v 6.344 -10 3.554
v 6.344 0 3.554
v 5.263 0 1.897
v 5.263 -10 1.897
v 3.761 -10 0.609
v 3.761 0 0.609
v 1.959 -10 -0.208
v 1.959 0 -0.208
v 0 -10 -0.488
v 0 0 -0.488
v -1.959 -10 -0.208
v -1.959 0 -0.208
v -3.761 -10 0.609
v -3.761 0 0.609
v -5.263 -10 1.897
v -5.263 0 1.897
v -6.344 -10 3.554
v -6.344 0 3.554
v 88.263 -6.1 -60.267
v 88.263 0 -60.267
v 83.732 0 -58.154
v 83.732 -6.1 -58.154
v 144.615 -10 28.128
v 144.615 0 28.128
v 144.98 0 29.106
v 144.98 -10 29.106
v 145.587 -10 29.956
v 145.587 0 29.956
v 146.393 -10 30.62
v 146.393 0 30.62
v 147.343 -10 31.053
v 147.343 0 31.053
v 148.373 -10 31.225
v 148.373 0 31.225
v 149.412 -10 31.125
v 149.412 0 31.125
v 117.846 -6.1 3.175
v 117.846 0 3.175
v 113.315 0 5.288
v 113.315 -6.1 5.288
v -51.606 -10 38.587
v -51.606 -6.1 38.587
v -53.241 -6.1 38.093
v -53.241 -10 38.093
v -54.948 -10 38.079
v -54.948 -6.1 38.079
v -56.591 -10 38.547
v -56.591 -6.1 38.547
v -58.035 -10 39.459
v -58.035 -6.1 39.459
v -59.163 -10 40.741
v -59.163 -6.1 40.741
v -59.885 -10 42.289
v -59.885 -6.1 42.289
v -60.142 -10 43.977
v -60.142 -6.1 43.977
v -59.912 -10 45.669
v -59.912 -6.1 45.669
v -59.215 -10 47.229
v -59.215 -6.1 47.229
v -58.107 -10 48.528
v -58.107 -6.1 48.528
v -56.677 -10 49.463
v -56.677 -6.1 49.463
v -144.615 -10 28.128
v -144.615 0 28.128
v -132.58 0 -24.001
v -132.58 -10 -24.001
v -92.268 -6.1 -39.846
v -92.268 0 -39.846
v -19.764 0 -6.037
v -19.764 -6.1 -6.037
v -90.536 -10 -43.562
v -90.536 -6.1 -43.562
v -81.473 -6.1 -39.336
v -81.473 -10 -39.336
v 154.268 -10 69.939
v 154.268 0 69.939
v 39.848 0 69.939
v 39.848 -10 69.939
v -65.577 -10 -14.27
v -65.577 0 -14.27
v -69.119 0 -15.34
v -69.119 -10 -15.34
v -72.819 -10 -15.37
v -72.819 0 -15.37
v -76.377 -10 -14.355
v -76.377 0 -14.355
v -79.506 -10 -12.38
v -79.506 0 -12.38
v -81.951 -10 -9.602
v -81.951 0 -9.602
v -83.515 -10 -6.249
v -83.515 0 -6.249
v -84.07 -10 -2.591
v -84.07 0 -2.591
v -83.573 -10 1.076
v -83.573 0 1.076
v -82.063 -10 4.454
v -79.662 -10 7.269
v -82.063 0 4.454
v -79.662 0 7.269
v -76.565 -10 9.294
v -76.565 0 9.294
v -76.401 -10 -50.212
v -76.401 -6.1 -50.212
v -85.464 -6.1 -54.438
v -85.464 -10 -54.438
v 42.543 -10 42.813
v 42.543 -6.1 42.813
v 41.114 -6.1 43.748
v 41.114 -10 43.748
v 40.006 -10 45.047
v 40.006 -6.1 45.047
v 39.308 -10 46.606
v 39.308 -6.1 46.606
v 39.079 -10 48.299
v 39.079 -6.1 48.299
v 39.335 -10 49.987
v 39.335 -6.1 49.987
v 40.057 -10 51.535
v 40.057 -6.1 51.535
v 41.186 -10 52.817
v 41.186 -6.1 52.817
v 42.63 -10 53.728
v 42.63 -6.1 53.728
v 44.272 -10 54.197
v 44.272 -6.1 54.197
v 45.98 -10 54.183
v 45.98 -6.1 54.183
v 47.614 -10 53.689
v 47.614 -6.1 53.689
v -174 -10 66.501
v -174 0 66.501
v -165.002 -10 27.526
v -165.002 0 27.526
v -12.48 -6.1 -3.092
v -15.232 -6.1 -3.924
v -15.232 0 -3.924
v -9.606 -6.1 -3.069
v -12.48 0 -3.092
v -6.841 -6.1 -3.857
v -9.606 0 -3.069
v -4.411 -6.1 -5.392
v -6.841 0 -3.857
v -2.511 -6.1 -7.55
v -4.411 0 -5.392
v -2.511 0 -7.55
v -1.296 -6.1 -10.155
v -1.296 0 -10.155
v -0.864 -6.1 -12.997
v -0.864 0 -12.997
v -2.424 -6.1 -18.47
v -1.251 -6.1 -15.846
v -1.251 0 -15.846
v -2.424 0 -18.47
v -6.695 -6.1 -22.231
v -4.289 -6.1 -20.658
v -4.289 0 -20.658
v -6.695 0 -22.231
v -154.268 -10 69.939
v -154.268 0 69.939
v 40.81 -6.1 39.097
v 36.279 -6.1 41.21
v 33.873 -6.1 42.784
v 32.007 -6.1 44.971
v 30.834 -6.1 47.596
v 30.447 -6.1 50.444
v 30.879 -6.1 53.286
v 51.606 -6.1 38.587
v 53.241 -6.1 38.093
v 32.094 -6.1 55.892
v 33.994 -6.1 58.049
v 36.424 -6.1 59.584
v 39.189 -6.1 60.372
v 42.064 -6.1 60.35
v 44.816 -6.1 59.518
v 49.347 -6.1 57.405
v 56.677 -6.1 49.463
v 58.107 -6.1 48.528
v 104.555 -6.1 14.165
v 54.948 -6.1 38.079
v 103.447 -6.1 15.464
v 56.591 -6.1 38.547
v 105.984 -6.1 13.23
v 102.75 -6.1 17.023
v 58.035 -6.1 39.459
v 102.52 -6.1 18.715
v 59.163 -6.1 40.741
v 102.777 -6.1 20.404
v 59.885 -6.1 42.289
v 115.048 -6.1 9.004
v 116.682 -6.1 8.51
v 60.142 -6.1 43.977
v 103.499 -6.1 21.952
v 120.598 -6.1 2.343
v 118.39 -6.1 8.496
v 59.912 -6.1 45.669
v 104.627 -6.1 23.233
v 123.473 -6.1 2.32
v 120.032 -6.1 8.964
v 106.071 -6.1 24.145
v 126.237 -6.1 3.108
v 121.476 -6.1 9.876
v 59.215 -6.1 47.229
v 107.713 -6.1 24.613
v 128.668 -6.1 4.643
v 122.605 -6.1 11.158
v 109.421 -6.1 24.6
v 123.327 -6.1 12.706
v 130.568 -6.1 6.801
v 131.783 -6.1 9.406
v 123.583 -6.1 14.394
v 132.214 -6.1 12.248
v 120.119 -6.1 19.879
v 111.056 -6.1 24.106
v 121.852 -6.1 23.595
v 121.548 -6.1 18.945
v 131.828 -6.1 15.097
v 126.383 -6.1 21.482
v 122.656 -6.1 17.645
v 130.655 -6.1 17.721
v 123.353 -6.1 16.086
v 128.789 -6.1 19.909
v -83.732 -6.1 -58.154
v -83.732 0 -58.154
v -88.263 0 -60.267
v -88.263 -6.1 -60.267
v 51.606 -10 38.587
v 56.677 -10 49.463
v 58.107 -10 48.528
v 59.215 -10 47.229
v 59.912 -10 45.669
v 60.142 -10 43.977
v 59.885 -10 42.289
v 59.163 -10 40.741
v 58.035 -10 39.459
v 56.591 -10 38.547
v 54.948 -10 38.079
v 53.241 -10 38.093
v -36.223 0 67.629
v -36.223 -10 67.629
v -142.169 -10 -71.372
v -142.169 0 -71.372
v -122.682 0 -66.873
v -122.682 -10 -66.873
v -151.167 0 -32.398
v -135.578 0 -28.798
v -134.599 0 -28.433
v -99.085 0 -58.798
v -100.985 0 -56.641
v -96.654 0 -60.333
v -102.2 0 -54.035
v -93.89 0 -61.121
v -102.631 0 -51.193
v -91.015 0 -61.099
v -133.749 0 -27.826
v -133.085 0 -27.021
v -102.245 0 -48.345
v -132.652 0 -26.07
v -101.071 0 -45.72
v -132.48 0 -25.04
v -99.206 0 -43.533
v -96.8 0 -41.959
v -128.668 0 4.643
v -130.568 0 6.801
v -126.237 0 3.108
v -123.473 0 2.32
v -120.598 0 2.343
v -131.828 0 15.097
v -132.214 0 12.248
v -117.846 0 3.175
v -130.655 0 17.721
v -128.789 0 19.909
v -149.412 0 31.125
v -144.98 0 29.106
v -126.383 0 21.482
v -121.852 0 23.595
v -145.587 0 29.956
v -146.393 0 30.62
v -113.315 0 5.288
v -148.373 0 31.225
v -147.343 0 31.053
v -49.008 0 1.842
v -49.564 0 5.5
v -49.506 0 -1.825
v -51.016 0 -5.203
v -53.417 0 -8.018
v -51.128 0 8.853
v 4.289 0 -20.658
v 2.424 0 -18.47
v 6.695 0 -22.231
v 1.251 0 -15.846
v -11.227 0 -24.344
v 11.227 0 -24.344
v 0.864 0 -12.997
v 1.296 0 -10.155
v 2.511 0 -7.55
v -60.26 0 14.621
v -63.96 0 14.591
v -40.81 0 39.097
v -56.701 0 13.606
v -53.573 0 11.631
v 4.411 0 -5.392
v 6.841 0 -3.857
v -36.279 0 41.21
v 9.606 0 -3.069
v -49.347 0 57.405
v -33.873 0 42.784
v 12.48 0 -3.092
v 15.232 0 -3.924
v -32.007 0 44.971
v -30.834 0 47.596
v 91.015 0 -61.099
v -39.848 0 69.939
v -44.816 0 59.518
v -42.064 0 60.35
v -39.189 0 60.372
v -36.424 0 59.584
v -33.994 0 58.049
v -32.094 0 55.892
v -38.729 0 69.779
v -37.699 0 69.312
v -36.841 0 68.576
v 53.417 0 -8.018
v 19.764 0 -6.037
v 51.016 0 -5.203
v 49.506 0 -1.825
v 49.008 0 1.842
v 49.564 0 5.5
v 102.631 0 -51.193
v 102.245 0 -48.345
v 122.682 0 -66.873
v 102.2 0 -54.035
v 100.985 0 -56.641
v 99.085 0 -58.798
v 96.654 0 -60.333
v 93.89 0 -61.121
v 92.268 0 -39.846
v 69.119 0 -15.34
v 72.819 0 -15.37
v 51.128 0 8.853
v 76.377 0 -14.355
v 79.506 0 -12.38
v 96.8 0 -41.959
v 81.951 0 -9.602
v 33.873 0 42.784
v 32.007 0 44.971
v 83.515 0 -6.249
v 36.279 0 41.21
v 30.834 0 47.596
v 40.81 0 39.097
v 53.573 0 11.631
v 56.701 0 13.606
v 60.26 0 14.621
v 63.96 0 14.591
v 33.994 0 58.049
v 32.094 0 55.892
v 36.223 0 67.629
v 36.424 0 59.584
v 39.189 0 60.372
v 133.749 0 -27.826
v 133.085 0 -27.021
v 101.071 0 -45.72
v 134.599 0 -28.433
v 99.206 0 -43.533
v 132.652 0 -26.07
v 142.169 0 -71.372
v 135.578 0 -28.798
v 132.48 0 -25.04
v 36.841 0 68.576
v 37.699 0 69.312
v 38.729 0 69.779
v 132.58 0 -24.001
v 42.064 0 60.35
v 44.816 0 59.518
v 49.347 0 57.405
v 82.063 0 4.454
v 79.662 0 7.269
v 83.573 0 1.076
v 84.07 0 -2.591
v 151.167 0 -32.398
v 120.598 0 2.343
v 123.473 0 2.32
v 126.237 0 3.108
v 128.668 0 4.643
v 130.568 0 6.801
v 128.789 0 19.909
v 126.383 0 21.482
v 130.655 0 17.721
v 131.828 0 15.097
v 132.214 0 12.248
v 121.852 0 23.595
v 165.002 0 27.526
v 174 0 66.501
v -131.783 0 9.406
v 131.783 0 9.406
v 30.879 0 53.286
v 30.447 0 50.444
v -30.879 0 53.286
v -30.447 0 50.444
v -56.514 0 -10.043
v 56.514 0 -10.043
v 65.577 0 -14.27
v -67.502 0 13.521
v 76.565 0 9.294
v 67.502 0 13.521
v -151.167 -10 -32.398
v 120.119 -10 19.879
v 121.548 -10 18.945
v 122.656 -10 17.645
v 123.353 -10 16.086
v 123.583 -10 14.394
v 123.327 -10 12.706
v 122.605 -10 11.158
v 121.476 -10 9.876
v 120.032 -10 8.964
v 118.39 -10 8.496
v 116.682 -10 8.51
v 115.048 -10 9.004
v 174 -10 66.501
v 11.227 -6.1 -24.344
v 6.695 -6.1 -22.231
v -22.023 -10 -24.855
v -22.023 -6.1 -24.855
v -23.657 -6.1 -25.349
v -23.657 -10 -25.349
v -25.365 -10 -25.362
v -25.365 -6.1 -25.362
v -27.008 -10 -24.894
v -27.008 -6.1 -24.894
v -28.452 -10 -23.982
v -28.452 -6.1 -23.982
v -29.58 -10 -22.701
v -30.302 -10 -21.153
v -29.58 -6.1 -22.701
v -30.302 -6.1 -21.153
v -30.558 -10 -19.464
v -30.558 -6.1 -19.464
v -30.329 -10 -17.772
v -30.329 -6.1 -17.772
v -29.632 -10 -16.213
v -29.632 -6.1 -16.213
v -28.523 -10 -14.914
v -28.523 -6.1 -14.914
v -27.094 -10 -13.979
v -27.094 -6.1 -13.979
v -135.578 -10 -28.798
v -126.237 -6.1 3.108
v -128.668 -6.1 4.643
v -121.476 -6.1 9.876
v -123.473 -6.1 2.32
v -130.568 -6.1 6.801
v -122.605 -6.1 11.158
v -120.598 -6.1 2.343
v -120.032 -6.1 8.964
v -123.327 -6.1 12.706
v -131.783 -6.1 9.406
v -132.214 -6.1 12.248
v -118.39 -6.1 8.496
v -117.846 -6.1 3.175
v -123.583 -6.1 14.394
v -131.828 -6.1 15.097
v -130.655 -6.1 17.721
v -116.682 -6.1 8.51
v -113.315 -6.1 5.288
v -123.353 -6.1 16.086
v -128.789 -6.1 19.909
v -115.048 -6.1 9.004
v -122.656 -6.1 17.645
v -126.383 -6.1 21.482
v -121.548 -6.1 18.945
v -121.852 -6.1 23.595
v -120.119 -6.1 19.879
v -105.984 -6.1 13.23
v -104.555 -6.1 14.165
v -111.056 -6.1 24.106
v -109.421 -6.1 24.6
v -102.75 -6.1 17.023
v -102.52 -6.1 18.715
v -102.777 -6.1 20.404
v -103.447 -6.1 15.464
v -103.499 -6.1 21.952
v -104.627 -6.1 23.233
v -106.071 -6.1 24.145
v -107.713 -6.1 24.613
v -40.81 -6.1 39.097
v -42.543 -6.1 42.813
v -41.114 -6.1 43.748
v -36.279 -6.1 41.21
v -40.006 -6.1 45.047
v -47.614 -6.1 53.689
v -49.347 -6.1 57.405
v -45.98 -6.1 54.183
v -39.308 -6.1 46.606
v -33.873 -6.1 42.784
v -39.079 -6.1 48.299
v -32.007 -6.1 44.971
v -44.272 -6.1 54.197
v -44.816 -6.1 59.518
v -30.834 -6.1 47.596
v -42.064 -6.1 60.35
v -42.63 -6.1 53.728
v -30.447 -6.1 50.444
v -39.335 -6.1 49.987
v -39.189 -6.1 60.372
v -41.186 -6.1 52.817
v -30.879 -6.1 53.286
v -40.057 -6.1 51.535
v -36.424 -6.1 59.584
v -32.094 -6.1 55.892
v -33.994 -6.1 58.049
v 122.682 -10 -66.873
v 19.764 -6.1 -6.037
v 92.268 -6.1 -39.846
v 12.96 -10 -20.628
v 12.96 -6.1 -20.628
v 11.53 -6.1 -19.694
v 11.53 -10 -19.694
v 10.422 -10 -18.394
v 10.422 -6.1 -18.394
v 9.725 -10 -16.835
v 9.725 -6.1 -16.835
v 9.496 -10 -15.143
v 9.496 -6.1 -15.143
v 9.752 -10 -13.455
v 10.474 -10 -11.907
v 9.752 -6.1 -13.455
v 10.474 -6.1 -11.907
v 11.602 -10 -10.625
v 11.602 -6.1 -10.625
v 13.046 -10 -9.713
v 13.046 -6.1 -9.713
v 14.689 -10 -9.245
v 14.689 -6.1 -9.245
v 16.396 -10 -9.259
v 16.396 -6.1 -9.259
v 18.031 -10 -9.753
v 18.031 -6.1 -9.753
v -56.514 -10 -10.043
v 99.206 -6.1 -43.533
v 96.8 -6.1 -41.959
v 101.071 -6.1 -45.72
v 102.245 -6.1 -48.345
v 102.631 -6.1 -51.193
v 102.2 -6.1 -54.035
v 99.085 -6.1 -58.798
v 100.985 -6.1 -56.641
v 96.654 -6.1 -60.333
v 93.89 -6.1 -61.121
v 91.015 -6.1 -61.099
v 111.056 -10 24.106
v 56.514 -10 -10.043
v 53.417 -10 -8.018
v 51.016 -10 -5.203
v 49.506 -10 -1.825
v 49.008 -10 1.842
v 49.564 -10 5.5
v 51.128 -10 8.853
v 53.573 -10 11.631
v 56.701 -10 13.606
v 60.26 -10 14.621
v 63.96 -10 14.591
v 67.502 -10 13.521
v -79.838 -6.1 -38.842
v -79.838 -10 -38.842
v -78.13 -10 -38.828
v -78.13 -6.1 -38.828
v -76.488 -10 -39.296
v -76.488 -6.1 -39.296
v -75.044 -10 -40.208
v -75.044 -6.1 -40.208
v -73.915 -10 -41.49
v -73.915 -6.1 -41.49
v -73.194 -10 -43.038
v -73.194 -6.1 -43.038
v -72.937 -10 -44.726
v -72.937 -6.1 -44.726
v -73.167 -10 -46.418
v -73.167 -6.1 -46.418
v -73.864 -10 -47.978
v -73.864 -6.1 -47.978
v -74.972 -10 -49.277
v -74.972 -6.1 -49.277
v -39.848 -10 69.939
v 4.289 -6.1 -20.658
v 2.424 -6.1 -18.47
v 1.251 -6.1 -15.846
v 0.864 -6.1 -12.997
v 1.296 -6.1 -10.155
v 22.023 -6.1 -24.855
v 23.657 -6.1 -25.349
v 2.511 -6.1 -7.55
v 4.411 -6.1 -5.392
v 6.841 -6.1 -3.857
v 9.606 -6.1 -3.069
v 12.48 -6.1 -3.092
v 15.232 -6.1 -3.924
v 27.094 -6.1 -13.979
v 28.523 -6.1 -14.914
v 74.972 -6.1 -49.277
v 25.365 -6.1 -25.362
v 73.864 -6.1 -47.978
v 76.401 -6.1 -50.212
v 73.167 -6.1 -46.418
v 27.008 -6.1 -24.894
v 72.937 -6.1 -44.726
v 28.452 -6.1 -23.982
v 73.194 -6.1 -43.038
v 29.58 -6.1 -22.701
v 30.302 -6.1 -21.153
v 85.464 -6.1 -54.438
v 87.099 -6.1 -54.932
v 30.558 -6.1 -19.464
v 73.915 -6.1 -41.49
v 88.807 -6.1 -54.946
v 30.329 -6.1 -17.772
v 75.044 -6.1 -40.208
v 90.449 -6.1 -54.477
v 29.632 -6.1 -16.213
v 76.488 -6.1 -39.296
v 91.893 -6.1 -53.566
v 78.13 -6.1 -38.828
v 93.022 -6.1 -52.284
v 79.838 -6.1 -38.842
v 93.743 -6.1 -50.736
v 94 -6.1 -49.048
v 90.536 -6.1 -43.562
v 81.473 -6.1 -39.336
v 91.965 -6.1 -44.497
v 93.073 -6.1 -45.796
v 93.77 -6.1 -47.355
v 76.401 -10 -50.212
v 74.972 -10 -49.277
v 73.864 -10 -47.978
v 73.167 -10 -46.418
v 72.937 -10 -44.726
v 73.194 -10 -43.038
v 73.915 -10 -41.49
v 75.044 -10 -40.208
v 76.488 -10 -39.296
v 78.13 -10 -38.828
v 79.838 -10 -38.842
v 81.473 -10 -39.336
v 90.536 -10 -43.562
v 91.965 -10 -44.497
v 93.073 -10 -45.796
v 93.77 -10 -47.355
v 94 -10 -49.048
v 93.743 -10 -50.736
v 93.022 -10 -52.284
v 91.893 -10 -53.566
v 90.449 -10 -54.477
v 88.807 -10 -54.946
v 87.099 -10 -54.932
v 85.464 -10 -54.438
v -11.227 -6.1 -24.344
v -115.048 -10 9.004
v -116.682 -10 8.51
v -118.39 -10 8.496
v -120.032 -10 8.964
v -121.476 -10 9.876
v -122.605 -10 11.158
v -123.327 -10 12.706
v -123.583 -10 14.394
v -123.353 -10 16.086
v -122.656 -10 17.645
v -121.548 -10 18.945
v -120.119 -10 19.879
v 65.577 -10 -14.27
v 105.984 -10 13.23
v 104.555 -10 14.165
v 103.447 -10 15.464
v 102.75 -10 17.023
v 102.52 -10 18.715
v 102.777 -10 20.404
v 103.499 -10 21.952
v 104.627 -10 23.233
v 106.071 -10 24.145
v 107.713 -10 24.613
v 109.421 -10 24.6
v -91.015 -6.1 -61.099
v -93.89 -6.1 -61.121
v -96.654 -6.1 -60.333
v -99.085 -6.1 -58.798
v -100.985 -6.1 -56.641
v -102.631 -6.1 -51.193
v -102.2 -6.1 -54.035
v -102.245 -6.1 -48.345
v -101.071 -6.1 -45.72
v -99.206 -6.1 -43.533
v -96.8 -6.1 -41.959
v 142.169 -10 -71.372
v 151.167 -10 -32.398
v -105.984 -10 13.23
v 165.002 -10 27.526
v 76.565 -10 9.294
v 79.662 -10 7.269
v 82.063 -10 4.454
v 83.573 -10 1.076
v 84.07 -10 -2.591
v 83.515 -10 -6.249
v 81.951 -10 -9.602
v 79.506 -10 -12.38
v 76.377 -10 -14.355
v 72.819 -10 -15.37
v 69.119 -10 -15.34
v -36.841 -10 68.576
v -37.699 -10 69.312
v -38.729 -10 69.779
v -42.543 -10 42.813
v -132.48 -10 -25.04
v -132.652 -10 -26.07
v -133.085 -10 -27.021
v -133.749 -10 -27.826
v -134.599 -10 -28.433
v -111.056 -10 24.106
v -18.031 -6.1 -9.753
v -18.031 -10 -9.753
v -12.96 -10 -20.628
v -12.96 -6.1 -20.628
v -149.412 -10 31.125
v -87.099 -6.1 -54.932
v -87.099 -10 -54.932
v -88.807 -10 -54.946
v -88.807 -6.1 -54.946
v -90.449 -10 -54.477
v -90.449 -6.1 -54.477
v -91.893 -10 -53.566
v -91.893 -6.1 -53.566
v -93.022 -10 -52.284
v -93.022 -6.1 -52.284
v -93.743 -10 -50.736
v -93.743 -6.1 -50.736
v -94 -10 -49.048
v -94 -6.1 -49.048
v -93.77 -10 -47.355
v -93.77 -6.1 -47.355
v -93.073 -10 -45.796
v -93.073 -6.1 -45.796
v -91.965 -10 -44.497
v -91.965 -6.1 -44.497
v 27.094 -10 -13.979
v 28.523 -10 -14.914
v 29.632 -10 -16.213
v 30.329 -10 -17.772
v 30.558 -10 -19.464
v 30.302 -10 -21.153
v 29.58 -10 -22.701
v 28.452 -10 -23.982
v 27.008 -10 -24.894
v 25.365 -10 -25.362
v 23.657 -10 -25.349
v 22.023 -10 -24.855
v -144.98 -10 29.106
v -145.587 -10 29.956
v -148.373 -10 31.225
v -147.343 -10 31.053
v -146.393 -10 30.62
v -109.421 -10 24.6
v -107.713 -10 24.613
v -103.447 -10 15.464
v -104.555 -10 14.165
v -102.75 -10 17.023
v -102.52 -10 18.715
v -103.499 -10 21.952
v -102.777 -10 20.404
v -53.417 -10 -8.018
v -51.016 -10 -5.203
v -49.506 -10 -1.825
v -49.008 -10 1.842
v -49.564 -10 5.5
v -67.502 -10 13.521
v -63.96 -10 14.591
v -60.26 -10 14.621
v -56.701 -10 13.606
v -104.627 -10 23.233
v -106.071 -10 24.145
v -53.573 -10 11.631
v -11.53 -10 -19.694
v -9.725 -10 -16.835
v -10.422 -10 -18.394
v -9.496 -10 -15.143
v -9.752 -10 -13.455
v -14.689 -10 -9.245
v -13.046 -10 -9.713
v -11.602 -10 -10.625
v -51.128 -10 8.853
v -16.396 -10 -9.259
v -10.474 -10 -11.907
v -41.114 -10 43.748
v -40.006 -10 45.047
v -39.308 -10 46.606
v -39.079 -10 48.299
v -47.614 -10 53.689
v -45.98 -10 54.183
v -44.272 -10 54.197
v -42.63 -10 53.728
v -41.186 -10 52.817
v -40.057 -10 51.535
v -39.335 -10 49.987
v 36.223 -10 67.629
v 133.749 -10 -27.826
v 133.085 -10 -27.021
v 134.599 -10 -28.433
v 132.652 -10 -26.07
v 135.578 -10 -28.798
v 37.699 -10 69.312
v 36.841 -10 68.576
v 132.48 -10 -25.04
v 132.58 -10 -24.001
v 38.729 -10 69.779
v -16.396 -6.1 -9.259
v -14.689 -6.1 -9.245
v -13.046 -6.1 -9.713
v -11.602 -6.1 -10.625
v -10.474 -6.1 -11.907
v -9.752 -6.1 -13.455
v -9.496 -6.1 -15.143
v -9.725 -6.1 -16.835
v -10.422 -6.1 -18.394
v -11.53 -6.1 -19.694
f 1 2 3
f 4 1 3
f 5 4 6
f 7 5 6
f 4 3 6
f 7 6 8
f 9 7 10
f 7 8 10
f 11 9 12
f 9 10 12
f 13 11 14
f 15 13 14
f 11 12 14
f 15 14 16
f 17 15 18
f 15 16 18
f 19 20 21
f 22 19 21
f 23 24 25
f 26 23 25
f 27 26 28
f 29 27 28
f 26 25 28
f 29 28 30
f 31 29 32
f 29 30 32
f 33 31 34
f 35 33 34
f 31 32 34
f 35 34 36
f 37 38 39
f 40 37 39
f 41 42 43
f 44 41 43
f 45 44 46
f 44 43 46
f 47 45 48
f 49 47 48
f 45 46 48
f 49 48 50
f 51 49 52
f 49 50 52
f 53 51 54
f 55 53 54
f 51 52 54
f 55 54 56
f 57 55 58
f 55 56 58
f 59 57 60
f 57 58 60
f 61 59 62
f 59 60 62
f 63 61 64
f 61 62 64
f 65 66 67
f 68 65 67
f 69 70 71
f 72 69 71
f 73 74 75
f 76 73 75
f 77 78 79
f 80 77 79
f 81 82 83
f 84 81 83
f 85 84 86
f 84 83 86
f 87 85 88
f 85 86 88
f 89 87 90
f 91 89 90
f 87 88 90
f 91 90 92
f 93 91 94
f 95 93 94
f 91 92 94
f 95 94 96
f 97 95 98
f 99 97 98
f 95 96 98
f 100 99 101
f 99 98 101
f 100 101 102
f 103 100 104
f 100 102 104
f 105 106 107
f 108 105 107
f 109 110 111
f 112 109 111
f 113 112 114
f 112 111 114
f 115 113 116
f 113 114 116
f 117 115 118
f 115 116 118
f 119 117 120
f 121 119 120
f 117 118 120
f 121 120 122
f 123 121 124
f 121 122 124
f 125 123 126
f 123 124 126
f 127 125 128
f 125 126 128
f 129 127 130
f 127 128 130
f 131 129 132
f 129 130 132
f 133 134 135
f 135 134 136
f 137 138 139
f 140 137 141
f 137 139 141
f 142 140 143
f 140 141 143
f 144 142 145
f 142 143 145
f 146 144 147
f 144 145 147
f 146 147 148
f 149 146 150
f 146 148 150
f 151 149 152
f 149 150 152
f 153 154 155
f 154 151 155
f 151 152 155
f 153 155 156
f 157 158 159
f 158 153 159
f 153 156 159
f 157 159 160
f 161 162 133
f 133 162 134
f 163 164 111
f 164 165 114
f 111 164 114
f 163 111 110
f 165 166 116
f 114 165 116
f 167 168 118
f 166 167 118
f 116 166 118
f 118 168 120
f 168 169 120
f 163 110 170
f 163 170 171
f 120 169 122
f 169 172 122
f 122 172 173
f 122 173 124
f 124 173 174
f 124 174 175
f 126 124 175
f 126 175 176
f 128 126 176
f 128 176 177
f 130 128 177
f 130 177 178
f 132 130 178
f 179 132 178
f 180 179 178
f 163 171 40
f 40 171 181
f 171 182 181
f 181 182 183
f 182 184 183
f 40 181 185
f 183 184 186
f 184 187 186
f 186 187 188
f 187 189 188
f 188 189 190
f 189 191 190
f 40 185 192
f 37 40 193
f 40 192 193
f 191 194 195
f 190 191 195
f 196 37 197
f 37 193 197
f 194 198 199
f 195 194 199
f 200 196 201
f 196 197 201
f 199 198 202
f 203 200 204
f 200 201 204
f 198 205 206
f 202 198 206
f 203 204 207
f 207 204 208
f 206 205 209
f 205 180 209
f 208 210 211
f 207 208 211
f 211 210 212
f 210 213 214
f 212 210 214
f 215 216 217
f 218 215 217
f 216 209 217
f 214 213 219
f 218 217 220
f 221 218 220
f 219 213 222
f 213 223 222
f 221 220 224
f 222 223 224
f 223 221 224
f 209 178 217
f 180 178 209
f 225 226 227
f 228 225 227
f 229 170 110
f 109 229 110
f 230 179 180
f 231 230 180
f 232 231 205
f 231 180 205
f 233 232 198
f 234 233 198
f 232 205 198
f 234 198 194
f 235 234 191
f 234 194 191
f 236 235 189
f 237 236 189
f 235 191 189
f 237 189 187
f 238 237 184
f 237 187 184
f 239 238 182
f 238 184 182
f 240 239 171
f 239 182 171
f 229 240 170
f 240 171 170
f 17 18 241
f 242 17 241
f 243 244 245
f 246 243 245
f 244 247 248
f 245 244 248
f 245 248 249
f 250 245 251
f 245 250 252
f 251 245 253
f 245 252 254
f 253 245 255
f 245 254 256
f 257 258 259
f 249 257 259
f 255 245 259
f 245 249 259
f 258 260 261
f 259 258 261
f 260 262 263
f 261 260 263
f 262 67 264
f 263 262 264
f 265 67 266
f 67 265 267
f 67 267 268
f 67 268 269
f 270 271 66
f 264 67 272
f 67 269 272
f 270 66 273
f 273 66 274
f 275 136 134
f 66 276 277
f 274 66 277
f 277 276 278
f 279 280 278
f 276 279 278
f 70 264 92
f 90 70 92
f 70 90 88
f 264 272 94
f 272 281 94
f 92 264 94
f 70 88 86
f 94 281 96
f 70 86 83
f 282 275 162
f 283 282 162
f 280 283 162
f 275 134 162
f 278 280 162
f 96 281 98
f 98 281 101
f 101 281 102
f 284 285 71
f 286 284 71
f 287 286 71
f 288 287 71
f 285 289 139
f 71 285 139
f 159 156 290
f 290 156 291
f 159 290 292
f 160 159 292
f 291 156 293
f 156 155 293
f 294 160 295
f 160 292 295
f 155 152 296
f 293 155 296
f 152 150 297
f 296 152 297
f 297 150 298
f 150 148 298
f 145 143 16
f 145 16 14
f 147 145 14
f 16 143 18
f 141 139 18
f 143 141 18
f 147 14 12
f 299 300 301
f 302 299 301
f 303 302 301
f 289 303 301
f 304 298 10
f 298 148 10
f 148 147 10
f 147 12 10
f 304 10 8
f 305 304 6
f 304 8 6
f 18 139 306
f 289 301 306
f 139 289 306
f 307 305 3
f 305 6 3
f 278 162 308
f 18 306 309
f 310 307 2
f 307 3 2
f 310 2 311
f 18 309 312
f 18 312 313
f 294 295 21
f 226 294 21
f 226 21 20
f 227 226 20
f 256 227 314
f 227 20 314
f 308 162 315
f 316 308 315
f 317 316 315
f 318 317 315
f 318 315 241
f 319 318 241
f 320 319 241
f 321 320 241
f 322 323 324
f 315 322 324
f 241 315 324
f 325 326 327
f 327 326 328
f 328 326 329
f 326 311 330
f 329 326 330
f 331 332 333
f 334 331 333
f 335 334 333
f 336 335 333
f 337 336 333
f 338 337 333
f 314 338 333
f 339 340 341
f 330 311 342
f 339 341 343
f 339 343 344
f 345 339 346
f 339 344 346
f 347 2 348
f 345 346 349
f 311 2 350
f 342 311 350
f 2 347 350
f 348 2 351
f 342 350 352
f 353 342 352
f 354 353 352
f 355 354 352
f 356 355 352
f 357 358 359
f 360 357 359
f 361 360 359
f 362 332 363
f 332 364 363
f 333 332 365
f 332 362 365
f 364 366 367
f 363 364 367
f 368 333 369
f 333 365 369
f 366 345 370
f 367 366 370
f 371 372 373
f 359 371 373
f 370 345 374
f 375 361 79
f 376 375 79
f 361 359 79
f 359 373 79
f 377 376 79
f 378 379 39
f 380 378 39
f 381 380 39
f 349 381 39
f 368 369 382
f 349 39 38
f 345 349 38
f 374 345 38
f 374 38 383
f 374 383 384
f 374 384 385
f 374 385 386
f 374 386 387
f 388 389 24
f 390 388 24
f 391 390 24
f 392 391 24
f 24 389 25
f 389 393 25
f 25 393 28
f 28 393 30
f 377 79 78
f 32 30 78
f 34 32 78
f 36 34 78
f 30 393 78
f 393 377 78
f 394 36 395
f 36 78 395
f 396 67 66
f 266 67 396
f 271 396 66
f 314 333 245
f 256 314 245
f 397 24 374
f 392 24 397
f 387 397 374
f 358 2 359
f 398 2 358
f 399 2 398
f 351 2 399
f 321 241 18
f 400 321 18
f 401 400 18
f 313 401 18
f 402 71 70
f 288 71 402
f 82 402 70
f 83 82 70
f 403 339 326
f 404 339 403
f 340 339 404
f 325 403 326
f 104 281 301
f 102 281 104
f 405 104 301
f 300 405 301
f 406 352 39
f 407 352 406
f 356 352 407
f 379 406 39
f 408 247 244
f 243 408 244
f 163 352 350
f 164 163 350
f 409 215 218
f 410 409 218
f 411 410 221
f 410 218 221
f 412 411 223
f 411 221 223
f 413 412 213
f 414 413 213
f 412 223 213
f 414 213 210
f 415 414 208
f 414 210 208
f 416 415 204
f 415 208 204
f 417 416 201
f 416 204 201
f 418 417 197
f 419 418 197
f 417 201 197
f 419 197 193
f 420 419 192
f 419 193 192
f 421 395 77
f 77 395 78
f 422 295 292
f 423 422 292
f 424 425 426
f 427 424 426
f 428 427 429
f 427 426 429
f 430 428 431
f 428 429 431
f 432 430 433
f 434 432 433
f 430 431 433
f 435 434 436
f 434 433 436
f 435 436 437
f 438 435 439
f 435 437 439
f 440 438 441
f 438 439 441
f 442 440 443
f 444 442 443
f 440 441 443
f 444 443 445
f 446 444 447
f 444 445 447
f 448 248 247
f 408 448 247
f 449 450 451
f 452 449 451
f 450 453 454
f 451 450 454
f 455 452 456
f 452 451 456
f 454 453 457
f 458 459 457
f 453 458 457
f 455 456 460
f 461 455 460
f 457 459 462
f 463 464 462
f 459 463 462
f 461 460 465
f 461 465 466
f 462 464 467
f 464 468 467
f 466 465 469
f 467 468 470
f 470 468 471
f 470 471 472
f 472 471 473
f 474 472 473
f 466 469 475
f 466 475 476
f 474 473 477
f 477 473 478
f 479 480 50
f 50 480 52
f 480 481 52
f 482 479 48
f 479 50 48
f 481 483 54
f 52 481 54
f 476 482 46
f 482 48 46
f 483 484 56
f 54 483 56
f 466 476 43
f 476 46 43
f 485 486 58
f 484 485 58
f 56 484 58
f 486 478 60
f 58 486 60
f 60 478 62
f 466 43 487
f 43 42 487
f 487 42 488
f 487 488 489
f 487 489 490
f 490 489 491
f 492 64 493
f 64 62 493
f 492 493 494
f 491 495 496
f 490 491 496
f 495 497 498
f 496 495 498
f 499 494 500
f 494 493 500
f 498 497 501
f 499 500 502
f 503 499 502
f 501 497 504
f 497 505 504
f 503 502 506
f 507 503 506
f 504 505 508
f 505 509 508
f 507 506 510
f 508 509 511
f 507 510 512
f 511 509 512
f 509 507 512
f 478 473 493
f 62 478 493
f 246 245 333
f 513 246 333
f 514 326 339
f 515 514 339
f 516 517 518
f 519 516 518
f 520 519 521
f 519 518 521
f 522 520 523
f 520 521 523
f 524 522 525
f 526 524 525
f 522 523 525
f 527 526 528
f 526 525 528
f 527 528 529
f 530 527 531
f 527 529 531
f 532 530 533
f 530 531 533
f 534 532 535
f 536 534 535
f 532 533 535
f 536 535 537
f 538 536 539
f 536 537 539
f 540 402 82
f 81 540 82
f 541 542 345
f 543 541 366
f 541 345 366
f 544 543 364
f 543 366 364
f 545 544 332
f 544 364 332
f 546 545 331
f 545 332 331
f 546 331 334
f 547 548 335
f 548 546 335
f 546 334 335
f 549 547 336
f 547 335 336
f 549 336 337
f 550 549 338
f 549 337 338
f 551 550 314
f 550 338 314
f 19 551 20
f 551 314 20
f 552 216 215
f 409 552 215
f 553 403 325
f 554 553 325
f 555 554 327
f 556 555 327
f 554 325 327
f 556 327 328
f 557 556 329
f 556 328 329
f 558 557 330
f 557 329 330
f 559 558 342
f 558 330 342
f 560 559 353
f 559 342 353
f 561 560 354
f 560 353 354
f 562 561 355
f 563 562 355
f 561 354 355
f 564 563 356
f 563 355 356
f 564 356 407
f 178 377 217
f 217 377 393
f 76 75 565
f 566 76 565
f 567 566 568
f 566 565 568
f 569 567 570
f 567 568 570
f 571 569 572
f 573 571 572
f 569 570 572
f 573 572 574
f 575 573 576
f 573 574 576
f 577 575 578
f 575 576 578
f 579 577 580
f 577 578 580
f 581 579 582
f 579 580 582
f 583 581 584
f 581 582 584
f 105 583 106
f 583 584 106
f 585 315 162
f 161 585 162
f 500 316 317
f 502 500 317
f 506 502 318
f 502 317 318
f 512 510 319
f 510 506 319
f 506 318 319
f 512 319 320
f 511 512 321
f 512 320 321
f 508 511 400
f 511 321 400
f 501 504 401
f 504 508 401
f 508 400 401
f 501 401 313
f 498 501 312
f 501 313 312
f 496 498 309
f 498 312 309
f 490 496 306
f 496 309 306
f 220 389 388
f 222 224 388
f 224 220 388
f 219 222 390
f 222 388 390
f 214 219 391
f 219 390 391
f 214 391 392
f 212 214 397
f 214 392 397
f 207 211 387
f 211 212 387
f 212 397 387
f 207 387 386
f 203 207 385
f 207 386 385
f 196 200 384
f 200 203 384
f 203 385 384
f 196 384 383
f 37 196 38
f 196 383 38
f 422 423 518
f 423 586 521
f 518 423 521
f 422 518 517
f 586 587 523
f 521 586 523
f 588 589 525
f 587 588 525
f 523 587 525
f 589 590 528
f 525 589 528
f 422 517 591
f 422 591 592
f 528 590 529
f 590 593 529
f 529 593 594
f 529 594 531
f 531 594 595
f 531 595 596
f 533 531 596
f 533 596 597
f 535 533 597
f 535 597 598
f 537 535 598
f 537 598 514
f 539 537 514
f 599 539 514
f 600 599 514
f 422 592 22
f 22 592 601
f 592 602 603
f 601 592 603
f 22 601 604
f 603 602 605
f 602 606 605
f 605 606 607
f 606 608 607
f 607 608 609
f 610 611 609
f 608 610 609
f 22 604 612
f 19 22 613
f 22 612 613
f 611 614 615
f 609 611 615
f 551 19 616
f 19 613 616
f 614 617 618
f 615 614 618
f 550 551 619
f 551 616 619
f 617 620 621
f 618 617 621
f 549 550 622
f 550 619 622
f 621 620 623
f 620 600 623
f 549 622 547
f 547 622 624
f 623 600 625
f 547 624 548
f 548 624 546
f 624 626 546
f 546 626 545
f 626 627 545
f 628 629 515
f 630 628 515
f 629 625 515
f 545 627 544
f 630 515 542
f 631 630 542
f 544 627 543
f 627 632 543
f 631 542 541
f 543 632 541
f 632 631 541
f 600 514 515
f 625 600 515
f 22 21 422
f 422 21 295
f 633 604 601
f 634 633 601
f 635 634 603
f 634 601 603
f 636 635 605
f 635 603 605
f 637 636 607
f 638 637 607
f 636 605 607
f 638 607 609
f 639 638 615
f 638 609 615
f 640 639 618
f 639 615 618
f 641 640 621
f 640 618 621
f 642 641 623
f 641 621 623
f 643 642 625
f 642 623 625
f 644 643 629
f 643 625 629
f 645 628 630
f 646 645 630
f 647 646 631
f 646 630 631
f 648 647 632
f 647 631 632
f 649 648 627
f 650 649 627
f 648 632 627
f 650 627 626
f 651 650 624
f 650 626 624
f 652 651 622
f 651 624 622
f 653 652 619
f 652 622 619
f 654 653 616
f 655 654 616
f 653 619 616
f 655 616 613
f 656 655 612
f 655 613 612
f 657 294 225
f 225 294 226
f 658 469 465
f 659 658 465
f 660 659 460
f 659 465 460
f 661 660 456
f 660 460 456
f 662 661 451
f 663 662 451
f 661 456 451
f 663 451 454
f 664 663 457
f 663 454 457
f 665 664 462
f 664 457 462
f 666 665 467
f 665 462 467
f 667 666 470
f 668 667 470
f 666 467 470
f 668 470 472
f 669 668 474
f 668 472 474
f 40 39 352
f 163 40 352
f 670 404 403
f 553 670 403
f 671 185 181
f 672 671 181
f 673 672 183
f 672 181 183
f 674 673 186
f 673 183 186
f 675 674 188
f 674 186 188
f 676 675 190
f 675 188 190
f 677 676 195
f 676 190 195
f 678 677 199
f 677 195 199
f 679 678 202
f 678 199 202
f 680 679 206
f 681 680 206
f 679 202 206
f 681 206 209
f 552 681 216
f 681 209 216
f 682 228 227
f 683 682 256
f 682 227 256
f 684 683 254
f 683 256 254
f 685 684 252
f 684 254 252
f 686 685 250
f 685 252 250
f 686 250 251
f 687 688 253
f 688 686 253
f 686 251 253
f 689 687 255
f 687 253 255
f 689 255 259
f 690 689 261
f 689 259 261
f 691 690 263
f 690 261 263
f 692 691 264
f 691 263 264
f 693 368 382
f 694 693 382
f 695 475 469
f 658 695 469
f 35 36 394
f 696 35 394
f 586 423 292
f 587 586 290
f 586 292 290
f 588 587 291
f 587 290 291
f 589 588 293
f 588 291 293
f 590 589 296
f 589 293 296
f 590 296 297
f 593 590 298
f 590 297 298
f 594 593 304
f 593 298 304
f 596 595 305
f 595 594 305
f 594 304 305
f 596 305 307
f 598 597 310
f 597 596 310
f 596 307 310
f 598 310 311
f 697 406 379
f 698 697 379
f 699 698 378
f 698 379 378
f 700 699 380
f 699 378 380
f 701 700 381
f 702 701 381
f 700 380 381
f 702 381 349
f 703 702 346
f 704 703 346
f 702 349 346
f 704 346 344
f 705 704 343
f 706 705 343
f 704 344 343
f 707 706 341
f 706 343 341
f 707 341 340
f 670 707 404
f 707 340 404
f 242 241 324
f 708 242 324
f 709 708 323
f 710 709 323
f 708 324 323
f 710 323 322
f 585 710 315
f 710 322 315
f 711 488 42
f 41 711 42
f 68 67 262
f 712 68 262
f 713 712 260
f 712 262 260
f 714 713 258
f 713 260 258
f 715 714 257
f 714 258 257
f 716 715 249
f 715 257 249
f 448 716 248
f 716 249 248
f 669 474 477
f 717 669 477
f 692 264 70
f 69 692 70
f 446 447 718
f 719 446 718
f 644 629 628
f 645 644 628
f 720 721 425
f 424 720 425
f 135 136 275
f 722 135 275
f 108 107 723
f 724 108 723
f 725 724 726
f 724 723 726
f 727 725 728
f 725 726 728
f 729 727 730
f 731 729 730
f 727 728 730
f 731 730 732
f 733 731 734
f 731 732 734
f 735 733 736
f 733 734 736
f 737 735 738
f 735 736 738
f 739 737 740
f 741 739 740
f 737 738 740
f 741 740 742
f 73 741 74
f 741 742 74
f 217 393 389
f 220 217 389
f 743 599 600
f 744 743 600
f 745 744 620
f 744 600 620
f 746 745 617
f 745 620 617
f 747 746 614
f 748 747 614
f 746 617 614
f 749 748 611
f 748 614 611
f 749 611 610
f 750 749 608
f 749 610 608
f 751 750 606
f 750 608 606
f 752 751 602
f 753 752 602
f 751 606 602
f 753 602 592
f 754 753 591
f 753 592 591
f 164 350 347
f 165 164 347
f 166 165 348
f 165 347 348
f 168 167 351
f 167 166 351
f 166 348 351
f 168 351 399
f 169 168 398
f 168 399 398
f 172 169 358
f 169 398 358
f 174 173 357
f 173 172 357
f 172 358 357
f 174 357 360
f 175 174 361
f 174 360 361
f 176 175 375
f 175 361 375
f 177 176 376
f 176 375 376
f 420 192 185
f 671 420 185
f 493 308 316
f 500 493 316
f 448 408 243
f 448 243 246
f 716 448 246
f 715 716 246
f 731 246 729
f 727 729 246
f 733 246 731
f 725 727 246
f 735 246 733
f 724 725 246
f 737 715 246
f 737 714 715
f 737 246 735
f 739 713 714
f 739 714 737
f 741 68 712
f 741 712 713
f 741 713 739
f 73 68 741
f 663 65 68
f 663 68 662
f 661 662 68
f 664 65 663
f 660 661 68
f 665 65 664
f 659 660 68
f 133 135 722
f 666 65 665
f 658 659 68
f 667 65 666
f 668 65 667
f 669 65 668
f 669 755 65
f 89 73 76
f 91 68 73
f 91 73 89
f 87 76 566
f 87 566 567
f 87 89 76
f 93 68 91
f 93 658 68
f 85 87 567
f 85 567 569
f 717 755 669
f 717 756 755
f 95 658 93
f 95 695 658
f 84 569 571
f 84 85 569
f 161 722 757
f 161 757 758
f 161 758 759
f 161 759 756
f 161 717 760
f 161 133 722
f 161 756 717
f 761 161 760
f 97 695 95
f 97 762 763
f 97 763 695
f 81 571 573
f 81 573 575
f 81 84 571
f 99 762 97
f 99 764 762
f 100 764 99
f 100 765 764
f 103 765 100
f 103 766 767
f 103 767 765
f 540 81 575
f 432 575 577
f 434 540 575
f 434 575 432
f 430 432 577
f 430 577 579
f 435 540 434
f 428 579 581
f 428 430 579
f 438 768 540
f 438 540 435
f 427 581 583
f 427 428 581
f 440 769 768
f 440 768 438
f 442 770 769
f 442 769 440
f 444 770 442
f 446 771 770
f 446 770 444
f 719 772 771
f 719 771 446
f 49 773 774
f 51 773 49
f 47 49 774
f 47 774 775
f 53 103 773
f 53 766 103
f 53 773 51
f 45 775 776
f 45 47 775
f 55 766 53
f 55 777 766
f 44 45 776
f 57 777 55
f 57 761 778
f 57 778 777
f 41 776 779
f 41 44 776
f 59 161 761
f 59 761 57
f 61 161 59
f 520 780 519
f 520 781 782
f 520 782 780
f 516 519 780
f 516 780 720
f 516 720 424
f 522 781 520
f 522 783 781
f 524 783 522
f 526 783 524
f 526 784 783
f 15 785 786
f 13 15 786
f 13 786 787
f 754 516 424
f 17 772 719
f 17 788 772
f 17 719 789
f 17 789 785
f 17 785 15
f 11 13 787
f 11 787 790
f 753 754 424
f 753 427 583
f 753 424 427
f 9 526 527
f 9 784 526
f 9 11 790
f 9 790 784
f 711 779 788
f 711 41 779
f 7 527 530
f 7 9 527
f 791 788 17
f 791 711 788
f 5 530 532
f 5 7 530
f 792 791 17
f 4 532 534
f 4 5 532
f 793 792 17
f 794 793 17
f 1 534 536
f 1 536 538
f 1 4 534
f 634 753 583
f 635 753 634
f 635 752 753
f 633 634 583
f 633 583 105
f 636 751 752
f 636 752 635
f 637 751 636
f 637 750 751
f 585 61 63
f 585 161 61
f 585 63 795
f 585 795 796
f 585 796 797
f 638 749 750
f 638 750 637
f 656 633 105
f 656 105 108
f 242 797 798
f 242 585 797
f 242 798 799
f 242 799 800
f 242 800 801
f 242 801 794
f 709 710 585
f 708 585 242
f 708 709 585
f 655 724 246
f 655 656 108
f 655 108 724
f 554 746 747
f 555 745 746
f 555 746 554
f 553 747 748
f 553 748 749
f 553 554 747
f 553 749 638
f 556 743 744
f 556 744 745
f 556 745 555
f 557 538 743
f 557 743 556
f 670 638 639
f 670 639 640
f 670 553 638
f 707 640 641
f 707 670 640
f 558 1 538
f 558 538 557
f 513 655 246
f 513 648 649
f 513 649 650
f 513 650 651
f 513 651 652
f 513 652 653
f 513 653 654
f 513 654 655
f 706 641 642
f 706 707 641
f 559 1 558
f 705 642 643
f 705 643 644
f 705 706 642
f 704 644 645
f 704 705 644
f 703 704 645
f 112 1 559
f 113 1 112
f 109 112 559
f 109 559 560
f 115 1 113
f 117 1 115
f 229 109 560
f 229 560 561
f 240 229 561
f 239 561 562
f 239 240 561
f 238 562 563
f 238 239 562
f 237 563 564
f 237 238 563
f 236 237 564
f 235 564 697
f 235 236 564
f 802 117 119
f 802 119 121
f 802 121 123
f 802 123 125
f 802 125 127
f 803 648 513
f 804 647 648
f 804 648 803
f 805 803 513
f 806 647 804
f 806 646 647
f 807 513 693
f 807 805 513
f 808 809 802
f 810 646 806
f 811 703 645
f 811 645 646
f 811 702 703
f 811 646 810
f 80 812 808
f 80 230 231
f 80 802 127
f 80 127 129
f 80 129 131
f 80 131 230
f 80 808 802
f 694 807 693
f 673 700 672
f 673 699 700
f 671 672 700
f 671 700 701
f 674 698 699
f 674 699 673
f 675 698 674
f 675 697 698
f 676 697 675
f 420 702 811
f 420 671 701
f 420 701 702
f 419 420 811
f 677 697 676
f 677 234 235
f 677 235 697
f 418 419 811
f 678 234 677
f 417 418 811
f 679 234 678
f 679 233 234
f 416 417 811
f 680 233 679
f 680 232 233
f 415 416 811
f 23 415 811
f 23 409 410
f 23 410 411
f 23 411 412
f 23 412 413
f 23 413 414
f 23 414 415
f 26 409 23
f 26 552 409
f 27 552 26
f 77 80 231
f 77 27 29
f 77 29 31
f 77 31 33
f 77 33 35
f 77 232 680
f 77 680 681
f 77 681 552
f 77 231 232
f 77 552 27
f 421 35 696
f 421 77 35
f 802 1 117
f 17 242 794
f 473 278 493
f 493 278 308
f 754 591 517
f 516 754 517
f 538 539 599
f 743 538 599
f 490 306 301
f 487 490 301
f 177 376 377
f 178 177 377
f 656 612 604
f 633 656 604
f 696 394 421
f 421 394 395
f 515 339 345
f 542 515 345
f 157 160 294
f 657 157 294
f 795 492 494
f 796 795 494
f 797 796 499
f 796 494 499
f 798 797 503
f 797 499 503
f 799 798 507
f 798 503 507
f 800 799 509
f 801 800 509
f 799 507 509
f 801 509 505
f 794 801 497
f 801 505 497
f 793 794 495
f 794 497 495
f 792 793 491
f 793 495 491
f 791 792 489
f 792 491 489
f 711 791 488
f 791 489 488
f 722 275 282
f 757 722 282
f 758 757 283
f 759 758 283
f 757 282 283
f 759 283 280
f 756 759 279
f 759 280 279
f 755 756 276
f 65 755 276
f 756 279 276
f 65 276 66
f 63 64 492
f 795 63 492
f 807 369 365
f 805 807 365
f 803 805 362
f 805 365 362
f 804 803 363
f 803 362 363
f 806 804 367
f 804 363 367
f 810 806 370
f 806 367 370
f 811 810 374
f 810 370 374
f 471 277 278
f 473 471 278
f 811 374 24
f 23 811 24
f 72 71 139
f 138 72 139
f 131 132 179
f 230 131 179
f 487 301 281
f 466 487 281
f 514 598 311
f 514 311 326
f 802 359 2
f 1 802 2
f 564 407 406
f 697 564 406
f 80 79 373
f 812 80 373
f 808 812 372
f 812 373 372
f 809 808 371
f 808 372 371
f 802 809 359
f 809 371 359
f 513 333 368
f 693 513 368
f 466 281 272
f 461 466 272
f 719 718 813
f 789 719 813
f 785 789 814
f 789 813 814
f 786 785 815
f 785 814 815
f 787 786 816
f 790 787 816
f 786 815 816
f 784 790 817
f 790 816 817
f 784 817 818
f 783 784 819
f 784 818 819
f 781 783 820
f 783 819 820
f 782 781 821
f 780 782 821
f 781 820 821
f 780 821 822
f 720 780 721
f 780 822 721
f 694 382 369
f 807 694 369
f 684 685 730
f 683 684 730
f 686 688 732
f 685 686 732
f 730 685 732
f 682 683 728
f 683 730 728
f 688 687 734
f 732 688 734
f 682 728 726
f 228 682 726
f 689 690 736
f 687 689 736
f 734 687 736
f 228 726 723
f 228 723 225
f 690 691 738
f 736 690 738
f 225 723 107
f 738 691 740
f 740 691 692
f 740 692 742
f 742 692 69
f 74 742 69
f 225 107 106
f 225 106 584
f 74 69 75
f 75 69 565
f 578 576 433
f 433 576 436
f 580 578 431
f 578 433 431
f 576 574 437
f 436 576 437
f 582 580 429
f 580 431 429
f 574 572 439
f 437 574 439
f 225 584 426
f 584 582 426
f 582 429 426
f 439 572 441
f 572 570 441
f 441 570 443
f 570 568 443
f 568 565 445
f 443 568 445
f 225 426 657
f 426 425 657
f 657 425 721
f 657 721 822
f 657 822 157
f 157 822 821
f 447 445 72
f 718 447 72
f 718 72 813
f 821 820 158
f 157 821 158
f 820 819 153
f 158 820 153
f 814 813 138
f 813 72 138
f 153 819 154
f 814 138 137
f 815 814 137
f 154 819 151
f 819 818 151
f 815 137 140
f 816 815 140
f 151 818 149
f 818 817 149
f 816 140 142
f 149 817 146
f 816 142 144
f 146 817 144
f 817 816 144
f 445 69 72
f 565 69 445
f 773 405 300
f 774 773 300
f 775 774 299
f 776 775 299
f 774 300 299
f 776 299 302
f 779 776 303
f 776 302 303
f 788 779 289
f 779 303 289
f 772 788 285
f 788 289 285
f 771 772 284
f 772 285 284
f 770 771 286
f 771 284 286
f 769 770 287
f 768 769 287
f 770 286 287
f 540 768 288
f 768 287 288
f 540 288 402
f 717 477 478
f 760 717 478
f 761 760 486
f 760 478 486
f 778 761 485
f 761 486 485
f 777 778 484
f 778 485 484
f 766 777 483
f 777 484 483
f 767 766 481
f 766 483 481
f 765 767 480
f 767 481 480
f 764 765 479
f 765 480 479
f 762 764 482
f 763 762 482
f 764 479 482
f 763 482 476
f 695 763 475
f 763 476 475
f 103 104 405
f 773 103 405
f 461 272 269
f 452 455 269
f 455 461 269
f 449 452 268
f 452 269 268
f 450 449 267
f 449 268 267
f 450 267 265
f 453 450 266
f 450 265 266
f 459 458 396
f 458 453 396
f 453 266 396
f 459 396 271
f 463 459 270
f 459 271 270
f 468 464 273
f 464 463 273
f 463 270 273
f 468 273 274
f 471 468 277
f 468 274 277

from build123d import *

# Parameters (mm, degrees)
F1_DEPTH = 10
F2_START = 6.1
F2_DEPTH = 3.9


with BuildPart() as f1:
    # F0 (on Front) → F1 (new body)
    with BuildSketch(Plane.XZ):
        with BuildLine():
            ThreePointArc((-36.2228804372, 67.6292184035), (-37.698913152, 69.3123111398), (-39.8481115853, 69.9387453565))
            Line((-39.8481115853, 69.9387453565), (-154.2675887644, 69.9387453565))
            Line((-154.2675887644, 69.9387453565), (-174, 66.5009789131))
            Line((-174, 66.5009789131), (-165.0019578262, 27.5261763217))
            Line((-165.0019578262, 27.5261763217), (-149.4120367897, 31.1253931912))
            ThreePointArc((-149.4120367897, 31.1253931912), (-146.3925555154, 30.6201053167), (-144.6147523132, 28.1277171494))
            Line((-144.6147523132, 28.1277171494), (-132.5798709058, -24.0010813166))
            ThreePointArc((-132.5798709058, -24.0010813166), (-133.0851587803, -27.0205625909), (-135.5775469475, -28.7983657931))
            Line((-135.5775469475, -28.7983657931), (-151.1674679841, -32.3975826626))
            Line((-151.1674679841, -32.3975826626), (-142.1694258103, -71.372385254))
            Line((-142.1694258103, -71.372385254), (-122.6820245146, -66.8733641671))
            Line((-122.6820245146, -66.8733641671), (122.6820245146, -66.8733641671))
            Line((122.6820245146, -66.8733641671), (142.1694258103, -71.372385254))
            Line((142.1694258103, -71.372385254), (151.1674679841, -32.3975826626))
            Line((151.1674679841, -32.3975826626), (135.5775469475, -28.7983657931))
            ThreePointArc((135.5775469475, -28.7983657931), (133.0851587803, -27.0205625909), (132.5798709058, -24.0010813166))
            Line((132.5798709058, -24.0010813166), (144.6147523132, 28.1277171494))
            ThreePointArc((144.6147523132, 28.1277171494), (146.3925555154, 30.6201053167), (149.4120367897, 31.1253931912))
            Line((149.4120367897, 31.1253931912), (165.0019578262, 27.5261763217))
            Line((165.0019578262, 27.5261763217), (174, 66.5009789131))
            Line((174, 66.5009789131), (154.2675887644, 69.9387453565))
            Line((154.2675887644, 69.9387453565), (39.8481115853, 69.9387453565))
            ThreePointArc((39.8481115853, 69.9387453565), (37.698913152, 69.3123111398), (36.2228804372, 67.6292184035))
            Line((36.2228804372, 67.6292184035), (6.3441545093, 3.554083875))
            ThreePointArc((6.3441545093, 3.554083875), (0, -0.4875882928), (-6.3441545093, 3.554083875))
            Line((-6.3441545093, 3.554083875), (-36.2228804372, 67.6292184035))
        make_face()
        with BuildLine():
            Line((-96.7999833788, -41.9593826596), (-92.2684444436, -39.8462913509))
            Line((-92.2684444436, -39.8462913509), (-19.7638214806, -6.0368304117))
            Line((-19.7638214806, -6.0368304117), (-15.2322825455, -3.923739103))
            ThreePointArc((-15.2322825455, -3.923739103), (-1.8101294528, -8.8090033085), (-6.6953936583, -22.2311564011))
            Line((-6.6953936583, -22.2311564011), (-11.2269325935, -24.3442477098))
            Line((-11.2269325935, -24.3442477098), (-83.7315555564, -58.1537086491))
            Line((-83.7315555564, -58.1537086491), (-88.2630944916, -60.2667999578))
            ThreePointArc((-88.2630944916, -60.2667999578), (-101.6852475843, -55.3815357523), (-96.7999833788, -41.9593826596))
        make_face(mode=Mode.SUBTRACT)
        with BuildLine():
            Line((88.2630944916, -60.2667999578), (83.7315555564, -58.1537086491))
            Line((83.7315555564, -58.1537086491), (11.2269325935, -24.3442477098))
            Line((11.2269325935, -24.3442477098), (6.6953936583, -22.2311564011))
            ThreePointArc((6.6953936583, -22.2311564011), (1.8101294528, -8.8090033085), (15.2322825455, -3.923739103))
            Line((15.2322825455, -3.923739103), (19.7638214806, -6.0368304117))
            Line((19.7638214806, -6.0368304117), (92.2684444436, -39.8462913509))
            Line((92.2684444436, -39.8462913509), (96.7999833788, -41.9593826596))
            ThreePointArc((96.7999833788, -41.9593826596), (101.6852475843, -55.3815357523), (88.2630944916, -60.2667999578))
        make_face(mode=Mode.SUBTRACT)
        with BuildLine():
            ThreePointArc((-65.576829212, -14.2695895243), (-82.8528678461, -7.9816256954), (-76.5649040173, 9.2944129387))
            Line((-76.5649040173, 9.2944129387), (-67.5018261469, 13.5205955561))
            ThreePointArc((-67.5018261469, 13.5205955561), (-50.2257875128, 7.2326317272), (-56.5137513416, -10.0434069069))
            Line((-56.5137513416, -10.0434069069), (-65.576829212, -14.2695895243))
        make_face(mode=Mode.SUBTRACT)
        with BuildLine():
            Line((-40.8102109153, 39.0972973828), (-113.3148338783, 5.2878364435))
            Line((-113.3148338783, 5.2878364435), (-117.8463728135, 3.1747451348))
            ThreePointArc((-117.8463728135, 3.1747451348), (-131.2685259061, 8.0600093403), (-126.3832617006, 21.4821624329))
            Line((-126.3832617006, 21.4821624329), (-121.8517227654, 23.5952537416))
            Line((-121.8517227654, 23.5952537416), (-49.3470998025, 57.4047146809))
            Line((-49.3470998025, 57.4047146809), (-44.8155608673, 59.5178059896))
            ThreePointArc((-44.8155608673, 59.5178059896), (-31.3934077747, 54.6325417841), (-36.2786719802, 41.2103886915))
            Line((-36.2786719802, 41.2103886915), (-40.8102109153, 39.0972973828))
        make_face(mode=Mode.SUBTRACT)
        with BuildLine():
            ThreePointArc((76.5649040173, 9.2944129387), (82.8528678461, -7.9816256954), (65.576829212, -14.2695895243))
            Line((65.576829212, -14.2695895243), (56.5137513416, -10.0434069069))
            ThreePointArc((56.5137513416, -10.0434069069), (50.2257875128, 7.2326317272), (67.5018261469, 13.5205955561))
            Line((67.5018261469, 13.5205955561), (76.5649040173, 9.2944129387))
        make_face(mode=Mode.SUBTRACT)
        with BuildLine():
            Line((49.3470998025, 57.4047146809), (121.8517227654, 23.5952537416))
            Line((121.8517227654, 23.5952537416), (126.3832617006, 21.4821624329))
            ThreePointArc((126.3832617006, 21.4821624329), (131.2685259061, 8.0600093403), (117.8463728135, 3.1747451348))
            Line((117.8463728135, 3.1747451348), (113.3148338783, 5.2878364435))
            Line((113.3148338783, 5.2878364435), (40.8102109153, 39.0972973828))
            Line((40.8102109153, 39.0972973828), (36.2786719802, 41.2103886915))
            ThreePointArc((36.2786719802, 41.2103886915), (31.3934077747, 54.6325417841), (44.8155608673, 59.5178059896))
            Line((44.8155608673, 59.5178059896), (49.3470998025, 57.4047146809))
        make_face(mode=Mode.SUBTRACT)
    extrude(amount=F1_DEPTH)

    # F0 (on Front) → F2 (join)
    with BuildSketch(Plane.XZ.offset(F2_START)):
        with BuildLine():
            Line((-117.8463728135, 3.1747451348), (-113.3148338783, 5.2878364435))
            Line((-113.3148338783, 5.2878364435), (-40.8102109153, 39.0972973828))
            Line((-40.8102109153, 39.0972973828), (-36.2786719802, 41.2103886915))
            ThreePointArc((-36.2786719802, 41.2103886915), (-31.3934077747, 54.6325417841), (-44.8155608673, 59.5178059896))
            Line((-44.8155608673, 59.5178059896), (-49.3470998025, 57.4047146809))
            Line((-49.3470998025, 57.4047146809), (-121.8517227654, 23.5952537416))
            Line((-121.8517227654, 23.5952537416), (-126.3832617006, 21.4821624329))
            ThreePointArc((-126.3832617006, 21.4821624329), (-131.2685259061, 8.0600093403), (-117.8463728135, 3.1747451348))
        make_face()
        with BuildLine():
            Line((-105.984490881, 13.2298809878), (-115.0475687514, 9.0036983703))
            ThreePointArc((-115.0475687514, 9.0036983703), (-123.0211250441, 11.9058355221), (-120.1189878923, 19.8793918148))
            Line((-120.1189878923, 19.8793918148), (-111.0559100219, 24.1055744322))
            ThreePointArc((-111.0559100219, 24.1055744322), (-103.0823537293, 21.2034372804), (-105.984490881, 13.2298809878))
        make_face(mode=Mode.SUBTRACT)
        with BuildLine():
            ThreePointArc((-47.6143649294, 53.688852754), (-39.6408086367, 50.7867156023), (-42.5429457885, 42.8131593096))
            Line((-42.5429457885, 42.8131593096), (-51.6060236588, 38.5869766922))
            ThreePointArc((-51.6060236588, 38.5869766922), (-59.5795799515, 41.489113844), (-56.6774427997, 49.4626701366))
            Line((-56.6774427997, 49.4626701366), (-47.6143649294, 53.688852754))
        make_face(mode=Mode.SUBTRACT)
        with BuildLine():
            Line((-19.7638214806, -6.0368304117), (-92.2684444436, -39.8462913509))
            Line((-92.2684444436, -39.8462913509), (-96.7999833788, -41.9593826596))
            ThreePointArc((-96.7999833788, -41.9593826596), (-101.6852475843, -55.3815357523), (-88.2630944916, -60.2667999578))
            Line((-88.2630944916, -60.2667999578), (-83.7315555564, -58.1537086491))
            Line((-83.7315555564, -58.1537086491), (-11.2269325935, -24.3442477098))
            Line((-11.2269325935, -24.3442477098), (-6.6953936583, -22.2311564011))
            ThreePointArc((-6.6953936583, -22.2311564011), (-1.8101294528, -8.8090033085), (-15.2322825455, -3.923739103))
            Line((-15.2322825455, -3.923739103), (-19.7638214806, -6.0368304117))
        make_face()
        with BuildLine():
            ThreePointArc((-85.4642904296, -54.4378467222), (-93.4378467222, -51.5357095704), (-90.5357095704, -43.5621532778))
            Line((-90.5357095704, -43.5621532778), (-81.4726317001, -39.3359706604))
            ThreePointArc((-81.4726317001, -39.3359706604), (-73.4990754074, -42.2381078121), (-76.4012125592, -50.2116641048))
            Line((-76.4012125592, -50.2116641048), (-85.4642904296, -54.4378467222))
        make_face(mode=Mode.SUBTRACT)
        with BuildLine():
            Line((-12.9596674666, -20.628385783), (-22.022745337, -24.8545684004))
            ThreePointArc((-22.022745337, -24.8545684004), (-29.9963016297, -21.9524312486), (-27.0941644779, -13.9788749559))
            Line((-27.0941644779, -13.9788749559), (-18.0310866075, -9.7526923385))
            ThreePointArc((-18.0310866075, -9.7526923385), (-10.0575303148, -12.6548294903), (-12.9596674666, -20.628385783))
        make_face(mode=Mode.SUBTRACT)
        with BuildLine():
            Line((126.3832617006, 21.4821624329), (121.8517227654, 23.5952537416))
            Line((121.8517227654, 23.5952537416), (49.3470998025, 57.4047146809))
            Line((49.3470998025, 57.4047146809), (44.8155608673, 59.5178059896))
            ThreePointArc((44.8155608673, 59.5178059896), (31.3934077747, 54.6325417841), (36.2786719802, 41.2103886915))
            Line((36.2786719802, 41.2103886915), (40.8102109153, 39.0972973828))
            Line((40.8102109153, 39.0972973828), (113.3148338783, 5.2878364435))
            Line((113.3148338783, 5.2878364435), (117.8463728135, 3.1747451348))
            ThreePointArc((117.8463728135, 3.1747451348), (131.2685259061, 8.0600093403), (126.3832617006, 21.4821624329))
        make_face()
        with BuildLine():
            ThreePointArc((120.1189878923, 19.8793918148), (123.0211250441, 11.9058355221), (115.0475687514, 9.0036983703))
            Line((115.0475687514, 9.0036983703), (105.984490881, 13.2298809878))
            ThreePointArc((105.984490881, 13.2298809878), (103.0823537293, 21.2034372804), (111.0559100219, 24.1055744322))
            Line((111.0559100219, 24.1055744322), (120.1189878923, 19.8793918148))
        make_face(mode=Mode.SUBTRACT)
        with BuildLine():
            ThreePointArc((42.5429457885, 42.8131593096), (39.6408086367, 50.7867156023), (47.6143649294, 53.688852754))
            Line((47.6143649294, 53.688852754), (56.6774427997, 49.4626701366))
            ThreePointArc((56.6774427997, 49.4626701366), (59.5795799515, 41.489113844), (51.6060236588, 38.5869766922))
            Line((51.6060236588, 38.5869766922), (42.5429457885, 42.8131593096))
        make_face(mode=Mode.SUBTRACT)
        with BuildLine():
            Line((11.2269325935, -24.3442477098), (83.7315555564, -58.1537086491))
            Line((83.7315555564, -58.1537086491), (88.2630944916, -60.2667999578))
            ThreePointArc((88.2630944916, -60.2667999578), (101.6852475843, -55.3815357523), (96.7999833788, -41.9593826596))
            Line((96.7999833788, -41.9593826596), (92.2684444436, -39.8462913509))
            Line((92.2684444436, -39.8462913509), (19.7638214806, -6.0368304117))
            Line((19.7638214806, -6.0368304117), (15.2322825455, -3.923739103))
            ThreePointArc((15.2322825455, -3.923739103), (1.8101294528, -8.8090033085), (6.6953936583, -22.2311564011))
            Line((6.6953936583, -22.2311564011), (11.2269325935, -24.3442477098))
        make_face()
        with BuildLine():
            ThreePointArc((90.5357095704, -43.5621532778), (93.4378467222, -51.5357095704), (85.4642904296, -54.4378467222))
            Line((85.4642904296, -54.4378467222), (76.4012125592, -50.2116641048))
            ThreePointArc((76.4012125592, -50.2116641048), (73.4990754074, -42.2381078121), (81.4726317001, -39.3359706604))
            Line((81.4726317001, -39.3359706604), (90.5357095704, -43.5621532778))
        make_face(mode=Mode.SUBTRACT)
        with BuildLine():
            ThreePointArc((12.9596674666, -20.628385783), (10.0575303148, -12.6548294903), (18.0310866075, -9.7526923385))
            Line((18.0310866075, -9.7526923385), (27.0941644779, -13.9788749559))
            ThreePointArc((27.0941644779, -13.9788749559), (29.9963016297, -21.9524312486), (22.022745337, -24.8545684004))
            Line((22.022745337, -24.8545684004), (12.9596674666, -20.628385783))
        make_face(mode=Mode.SUBTRACT)
    extrude(amount=F2_DEPTH)


solid = f1.part
